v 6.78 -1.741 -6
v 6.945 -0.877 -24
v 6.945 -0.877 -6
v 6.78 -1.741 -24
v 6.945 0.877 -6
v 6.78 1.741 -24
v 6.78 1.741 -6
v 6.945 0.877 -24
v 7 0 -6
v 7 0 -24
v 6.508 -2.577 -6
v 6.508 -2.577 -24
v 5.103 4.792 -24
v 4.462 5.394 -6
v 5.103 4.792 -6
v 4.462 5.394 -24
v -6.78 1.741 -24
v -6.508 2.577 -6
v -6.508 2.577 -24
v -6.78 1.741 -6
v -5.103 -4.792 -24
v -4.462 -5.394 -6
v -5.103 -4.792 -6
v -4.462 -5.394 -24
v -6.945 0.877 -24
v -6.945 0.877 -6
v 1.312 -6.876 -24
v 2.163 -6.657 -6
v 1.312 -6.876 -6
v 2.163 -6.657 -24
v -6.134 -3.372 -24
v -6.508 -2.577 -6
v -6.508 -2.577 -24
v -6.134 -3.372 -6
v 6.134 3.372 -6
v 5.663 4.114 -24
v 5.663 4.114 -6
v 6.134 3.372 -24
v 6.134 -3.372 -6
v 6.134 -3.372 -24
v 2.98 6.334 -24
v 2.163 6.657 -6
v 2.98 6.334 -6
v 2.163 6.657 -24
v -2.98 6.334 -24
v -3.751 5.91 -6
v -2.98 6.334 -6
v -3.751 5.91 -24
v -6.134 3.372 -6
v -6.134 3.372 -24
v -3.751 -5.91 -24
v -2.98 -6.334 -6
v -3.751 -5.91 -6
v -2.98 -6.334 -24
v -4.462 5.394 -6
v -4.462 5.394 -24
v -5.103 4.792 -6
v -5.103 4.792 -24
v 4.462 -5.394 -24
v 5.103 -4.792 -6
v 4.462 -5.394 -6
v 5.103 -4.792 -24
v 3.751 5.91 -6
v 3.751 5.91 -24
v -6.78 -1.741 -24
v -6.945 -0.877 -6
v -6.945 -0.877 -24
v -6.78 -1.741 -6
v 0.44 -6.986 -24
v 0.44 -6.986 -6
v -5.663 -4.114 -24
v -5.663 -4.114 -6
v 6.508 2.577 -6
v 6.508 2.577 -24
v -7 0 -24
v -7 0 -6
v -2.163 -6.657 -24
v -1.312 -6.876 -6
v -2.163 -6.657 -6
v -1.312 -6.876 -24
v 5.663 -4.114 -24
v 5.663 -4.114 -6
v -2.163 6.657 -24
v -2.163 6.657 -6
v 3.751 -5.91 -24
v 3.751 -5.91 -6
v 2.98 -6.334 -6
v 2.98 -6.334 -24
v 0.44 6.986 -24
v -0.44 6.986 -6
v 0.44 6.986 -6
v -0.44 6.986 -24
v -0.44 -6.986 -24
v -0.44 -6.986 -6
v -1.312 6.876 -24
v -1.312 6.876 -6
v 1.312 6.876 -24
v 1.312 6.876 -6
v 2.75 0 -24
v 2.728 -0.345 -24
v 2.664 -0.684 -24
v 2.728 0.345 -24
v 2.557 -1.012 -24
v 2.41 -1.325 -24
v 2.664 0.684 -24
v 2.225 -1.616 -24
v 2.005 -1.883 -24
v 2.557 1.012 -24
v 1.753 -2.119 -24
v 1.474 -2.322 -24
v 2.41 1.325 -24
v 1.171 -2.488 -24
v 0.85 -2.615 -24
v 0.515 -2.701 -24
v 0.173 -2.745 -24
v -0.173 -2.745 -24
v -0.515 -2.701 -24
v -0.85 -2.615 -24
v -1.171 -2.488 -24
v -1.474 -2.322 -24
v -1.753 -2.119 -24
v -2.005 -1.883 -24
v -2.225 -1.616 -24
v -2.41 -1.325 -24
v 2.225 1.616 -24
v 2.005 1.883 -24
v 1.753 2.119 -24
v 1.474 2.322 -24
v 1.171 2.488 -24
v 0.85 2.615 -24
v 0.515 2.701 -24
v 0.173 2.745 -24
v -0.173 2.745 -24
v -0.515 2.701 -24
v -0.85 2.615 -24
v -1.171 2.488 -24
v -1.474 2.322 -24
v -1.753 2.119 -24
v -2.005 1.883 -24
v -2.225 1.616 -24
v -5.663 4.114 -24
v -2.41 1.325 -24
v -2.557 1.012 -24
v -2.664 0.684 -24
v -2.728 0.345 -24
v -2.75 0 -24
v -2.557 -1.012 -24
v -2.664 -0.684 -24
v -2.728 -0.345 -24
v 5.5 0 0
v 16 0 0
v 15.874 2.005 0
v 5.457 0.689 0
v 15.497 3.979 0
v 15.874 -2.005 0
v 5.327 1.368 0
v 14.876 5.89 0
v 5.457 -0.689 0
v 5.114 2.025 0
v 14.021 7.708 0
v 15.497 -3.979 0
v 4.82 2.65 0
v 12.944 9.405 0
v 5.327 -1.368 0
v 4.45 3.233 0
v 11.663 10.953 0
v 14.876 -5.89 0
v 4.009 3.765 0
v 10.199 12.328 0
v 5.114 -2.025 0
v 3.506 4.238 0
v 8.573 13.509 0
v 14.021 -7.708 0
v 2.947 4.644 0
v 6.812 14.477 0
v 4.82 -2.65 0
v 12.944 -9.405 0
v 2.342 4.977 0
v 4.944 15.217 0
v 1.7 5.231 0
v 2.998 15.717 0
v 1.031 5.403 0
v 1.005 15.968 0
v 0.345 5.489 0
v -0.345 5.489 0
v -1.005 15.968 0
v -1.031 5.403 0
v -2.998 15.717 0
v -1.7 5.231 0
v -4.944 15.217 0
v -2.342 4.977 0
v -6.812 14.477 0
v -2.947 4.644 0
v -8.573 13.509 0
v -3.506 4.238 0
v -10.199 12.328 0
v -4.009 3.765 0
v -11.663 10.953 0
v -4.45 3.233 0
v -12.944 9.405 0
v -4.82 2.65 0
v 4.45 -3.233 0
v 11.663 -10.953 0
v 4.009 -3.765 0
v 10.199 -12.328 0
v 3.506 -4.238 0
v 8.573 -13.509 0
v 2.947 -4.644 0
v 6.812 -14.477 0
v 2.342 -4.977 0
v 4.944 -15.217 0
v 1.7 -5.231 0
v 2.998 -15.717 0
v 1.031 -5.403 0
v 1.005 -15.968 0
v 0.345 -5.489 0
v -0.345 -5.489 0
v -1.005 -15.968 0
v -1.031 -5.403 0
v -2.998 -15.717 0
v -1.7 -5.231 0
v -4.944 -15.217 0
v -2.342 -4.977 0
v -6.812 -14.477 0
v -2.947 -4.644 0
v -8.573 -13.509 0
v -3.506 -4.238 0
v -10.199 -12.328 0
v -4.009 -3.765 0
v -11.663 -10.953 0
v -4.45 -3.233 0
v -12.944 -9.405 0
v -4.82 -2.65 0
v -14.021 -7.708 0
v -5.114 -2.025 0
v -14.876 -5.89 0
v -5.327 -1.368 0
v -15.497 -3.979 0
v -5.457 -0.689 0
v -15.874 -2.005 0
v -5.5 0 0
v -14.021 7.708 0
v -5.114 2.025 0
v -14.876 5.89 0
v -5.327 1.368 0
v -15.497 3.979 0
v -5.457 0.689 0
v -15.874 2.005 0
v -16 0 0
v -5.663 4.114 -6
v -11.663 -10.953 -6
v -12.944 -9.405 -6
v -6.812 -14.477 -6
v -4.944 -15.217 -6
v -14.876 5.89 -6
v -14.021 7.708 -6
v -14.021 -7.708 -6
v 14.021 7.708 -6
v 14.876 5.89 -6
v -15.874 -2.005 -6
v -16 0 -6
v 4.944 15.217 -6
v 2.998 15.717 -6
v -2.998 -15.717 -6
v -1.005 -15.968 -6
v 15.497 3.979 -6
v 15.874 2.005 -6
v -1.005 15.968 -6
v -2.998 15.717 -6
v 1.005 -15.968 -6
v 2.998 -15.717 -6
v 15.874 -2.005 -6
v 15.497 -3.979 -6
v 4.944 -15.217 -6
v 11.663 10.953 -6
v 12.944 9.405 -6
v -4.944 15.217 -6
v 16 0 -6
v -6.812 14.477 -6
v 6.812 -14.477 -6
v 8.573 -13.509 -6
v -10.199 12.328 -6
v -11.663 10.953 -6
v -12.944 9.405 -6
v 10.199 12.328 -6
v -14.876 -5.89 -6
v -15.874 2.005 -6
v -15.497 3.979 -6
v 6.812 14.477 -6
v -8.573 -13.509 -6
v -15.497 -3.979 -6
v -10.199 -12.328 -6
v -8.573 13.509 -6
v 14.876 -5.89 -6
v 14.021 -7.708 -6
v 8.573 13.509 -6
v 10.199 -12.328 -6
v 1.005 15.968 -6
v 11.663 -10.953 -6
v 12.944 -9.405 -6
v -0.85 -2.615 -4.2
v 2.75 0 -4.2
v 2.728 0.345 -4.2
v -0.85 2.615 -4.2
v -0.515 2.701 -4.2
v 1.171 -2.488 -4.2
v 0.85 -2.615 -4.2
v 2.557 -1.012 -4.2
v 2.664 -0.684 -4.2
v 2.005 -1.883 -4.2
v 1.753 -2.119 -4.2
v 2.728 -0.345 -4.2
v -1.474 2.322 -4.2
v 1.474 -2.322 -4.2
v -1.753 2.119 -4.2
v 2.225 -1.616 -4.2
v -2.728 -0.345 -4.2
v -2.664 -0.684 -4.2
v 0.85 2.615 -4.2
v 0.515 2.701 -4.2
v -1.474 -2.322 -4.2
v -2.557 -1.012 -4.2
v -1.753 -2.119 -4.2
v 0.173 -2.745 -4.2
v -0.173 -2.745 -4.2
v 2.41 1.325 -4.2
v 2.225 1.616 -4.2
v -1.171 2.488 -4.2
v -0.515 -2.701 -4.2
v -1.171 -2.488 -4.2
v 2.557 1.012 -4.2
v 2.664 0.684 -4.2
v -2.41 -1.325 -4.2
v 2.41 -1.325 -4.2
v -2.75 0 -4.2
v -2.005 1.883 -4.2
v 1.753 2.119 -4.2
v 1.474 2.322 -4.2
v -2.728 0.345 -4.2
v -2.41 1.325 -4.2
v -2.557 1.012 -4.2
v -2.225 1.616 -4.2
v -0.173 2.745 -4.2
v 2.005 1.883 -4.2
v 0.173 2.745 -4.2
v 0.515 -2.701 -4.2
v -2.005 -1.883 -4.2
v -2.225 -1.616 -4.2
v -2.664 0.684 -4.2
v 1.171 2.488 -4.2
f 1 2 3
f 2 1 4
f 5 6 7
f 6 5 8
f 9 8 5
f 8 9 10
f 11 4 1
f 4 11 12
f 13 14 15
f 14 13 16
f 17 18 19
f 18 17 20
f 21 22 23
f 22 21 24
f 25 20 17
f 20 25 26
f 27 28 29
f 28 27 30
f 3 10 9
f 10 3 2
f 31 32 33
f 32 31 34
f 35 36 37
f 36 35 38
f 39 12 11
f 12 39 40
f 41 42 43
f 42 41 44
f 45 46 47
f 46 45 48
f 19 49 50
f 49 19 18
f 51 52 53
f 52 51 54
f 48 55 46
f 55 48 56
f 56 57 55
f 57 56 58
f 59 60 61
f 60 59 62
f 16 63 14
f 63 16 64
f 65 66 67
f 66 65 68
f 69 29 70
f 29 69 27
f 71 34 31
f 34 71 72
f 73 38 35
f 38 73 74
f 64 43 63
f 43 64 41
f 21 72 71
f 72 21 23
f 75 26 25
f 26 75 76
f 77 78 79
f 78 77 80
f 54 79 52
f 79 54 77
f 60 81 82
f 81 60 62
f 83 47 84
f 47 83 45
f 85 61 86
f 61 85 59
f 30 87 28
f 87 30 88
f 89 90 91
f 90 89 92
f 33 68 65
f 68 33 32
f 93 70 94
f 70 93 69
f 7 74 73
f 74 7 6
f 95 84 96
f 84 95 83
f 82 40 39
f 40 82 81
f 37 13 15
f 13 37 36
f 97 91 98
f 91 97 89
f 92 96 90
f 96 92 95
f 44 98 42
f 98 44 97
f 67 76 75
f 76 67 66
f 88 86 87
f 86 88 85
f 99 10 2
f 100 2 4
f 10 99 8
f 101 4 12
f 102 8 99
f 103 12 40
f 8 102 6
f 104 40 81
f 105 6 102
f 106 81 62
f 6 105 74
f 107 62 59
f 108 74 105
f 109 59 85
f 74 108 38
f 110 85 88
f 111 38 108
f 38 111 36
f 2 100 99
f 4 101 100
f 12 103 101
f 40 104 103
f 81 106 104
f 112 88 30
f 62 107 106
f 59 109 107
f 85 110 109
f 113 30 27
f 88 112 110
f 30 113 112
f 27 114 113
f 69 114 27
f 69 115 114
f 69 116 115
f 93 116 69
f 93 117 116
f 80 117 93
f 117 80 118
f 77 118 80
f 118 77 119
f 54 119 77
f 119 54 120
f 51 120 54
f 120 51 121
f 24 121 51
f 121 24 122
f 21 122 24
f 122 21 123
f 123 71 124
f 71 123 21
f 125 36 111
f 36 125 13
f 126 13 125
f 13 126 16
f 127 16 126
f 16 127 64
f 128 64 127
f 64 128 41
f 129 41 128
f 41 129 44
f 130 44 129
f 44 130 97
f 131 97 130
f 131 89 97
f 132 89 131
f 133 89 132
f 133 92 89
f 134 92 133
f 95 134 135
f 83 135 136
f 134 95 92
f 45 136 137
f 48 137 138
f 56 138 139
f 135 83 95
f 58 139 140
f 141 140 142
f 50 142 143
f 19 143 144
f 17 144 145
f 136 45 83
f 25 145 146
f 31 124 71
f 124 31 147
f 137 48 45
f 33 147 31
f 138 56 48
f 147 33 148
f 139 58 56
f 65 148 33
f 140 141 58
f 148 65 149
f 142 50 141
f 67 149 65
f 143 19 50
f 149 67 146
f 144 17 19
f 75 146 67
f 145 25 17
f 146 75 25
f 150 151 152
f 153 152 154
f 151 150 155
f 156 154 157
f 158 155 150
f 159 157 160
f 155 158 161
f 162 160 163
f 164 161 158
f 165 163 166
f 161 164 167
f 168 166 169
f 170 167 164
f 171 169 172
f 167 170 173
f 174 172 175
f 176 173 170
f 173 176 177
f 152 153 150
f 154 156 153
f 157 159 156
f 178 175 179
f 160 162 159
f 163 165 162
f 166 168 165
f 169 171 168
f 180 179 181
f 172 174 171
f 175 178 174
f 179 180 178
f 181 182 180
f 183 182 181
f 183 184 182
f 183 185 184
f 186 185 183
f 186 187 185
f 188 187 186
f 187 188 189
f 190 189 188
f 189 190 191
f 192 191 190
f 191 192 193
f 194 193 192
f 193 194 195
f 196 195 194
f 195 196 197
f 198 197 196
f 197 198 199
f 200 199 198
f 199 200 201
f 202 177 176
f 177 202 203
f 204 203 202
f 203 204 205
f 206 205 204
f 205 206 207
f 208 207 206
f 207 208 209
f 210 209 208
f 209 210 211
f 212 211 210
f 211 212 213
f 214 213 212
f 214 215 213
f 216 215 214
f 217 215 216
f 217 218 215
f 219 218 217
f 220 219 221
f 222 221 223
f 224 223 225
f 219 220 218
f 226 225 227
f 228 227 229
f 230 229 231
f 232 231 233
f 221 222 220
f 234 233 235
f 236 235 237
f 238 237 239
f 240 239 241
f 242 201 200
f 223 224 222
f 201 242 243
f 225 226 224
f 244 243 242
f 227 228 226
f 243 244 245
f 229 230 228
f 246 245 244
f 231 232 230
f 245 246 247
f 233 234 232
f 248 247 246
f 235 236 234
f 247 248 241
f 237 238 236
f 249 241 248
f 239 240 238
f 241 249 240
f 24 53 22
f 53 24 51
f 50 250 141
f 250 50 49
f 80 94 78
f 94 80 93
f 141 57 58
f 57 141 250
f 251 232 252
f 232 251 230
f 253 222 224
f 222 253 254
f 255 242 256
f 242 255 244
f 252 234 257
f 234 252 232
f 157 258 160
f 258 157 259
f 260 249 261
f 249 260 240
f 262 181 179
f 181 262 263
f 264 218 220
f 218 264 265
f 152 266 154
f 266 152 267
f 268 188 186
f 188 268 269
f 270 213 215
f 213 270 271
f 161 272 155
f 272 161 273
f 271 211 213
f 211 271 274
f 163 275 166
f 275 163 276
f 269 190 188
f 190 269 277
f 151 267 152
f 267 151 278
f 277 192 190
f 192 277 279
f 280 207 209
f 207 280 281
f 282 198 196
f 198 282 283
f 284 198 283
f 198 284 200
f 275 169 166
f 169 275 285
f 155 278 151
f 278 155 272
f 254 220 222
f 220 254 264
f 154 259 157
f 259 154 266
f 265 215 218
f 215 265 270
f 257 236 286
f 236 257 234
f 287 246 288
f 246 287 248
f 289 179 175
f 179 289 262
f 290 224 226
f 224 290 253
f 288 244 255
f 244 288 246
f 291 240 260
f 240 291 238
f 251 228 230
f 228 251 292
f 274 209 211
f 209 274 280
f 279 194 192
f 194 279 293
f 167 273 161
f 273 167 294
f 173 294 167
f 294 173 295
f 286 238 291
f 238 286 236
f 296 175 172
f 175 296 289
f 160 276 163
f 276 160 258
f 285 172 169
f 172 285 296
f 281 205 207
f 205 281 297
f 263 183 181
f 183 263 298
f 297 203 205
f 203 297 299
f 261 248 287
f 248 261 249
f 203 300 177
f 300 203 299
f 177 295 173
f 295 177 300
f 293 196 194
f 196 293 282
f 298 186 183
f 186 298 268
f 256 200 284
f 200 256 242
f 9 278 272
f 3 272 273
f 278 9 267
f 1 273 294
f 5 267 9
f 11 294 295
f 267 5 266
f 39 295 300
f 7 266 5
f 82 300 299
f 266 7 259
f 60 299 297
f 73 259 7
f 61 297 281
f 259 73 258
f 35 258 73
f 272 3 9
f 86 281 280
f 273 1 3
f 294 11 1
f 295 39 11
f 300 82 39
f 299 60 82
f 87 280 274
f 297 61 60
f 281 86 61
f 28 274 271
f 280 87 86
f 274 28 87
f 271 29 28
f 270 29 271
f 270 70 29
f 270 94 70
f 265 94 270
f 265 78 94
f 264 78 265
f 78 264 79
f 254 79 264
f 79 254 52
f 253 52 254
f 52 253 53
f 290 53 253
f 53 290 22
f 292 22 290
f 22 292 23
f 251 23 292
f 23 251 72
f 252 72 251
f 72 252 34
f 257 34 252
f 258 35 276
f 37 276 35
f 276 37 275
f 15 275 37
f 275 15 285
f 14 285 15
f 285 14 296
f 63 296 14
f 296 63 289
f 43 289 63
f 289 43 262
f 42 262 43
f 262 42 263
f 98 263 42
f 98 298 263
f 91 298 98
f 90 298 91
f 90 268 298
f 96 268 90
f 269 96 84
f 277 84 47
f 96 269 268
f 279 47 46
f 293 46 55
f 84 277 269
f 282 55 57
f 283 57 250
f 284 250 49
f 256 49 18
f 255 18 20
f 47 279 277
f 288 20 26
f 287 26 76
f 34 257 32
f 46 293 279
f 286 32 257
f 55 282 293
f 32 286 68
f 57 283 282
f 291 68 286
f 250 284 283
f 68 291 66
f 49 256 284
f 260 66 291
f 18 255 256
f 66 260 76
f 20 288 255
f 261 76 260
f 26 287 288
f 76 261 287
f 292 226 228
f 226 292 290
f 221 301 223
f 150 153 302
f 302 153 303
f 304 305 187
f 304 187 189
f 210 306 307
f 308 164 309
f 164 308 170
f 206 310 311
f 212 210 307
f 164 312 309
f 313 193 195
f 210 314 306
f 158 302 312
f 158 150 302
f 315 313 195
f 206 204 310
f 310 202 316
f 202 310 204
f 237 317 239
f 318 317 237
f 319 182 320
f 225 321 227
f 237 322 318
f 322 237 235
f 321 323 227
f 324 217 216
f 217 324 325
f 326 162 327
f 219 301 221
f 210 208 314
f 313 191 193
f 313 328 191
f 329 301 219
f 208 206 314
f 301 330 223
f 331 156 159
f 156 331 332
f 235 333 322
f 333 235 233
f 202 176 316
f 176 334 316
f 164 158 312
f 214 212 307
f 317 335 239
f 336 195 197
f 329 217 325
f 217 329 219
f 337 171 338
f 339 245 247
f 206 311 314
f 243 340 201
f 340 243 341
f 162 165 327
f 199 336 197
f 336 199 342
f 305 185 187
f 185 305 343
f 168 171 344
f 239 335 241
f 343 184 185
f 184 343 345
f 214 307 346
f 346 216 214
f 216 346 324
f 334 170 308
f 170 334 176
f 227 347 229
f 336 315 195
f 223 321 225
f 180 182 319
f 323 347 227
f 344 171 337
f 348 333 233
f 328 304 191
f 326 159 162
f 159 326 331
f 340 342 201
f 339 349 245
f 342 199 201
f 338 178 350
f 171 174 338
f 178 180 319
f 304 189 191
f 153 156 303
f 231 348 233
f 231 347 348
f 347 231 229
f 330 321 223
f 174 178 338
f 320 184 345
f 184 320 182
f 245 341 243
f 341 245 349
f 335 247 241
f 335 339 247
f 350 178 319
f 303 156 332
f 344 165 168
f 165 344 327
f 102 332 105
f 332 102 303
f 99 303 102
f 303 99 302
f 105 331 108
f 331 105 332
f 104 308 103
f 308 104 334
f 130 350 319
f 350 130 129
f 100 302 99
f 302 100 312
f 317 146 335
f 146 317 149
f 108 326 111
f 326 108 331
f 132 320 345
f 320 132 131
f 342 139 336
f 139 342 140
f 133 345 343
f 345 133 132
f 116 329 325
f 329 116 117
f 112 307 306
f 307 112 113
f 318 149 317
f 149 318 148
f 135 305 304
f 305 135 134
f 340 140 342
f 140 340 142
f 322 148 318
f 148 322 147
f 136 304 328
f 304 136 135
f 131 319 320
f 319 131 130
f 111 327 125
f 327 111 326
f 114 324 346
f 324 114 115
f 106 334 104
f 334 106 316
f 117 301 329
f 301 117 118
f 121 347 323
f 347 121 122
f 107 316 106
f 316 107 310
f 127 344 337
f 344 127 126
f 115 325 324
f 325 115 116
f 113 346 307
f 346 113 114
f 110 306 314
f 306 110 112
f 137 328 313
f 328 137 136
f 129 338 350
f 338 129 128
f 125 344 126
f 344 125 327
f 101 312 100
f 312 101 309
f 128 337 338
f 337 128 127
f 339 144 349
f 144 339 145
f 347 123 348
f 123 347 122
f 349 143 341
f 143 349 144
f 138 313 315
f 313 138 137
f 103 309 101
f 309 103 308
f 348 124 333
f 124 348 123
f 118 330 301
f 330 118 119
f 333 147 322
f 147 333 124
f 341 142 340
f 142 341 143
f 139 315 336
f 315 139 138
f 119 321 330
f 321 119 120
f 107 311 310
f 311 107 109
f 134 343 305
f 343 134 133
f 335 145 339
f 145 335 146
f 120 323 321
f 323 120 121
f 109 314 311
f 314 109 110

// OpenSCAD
$fn = 50;


difference() {
	union() {
		translate(v = [0, 0, -24.0000000000]) {
			cylinder(h = 24, r = 7.0000000000);
		}
		translate(v = [0, 0, -6.0000000000]) {
			cylinder(h = 6, r = 16.0000000000);
		}
	}
	union() {
		translate(v = [0, 0, 0]) {
			rotate(a = [0, 0, 0]) {
				difference() {
					union() {
						#translate(v = [0, 0, -24.0000000000]) {
							cylinder(h = 24, r = 2.2500000000);
						}
						#translate(v = [0, 0, -4.2000000000]) {
							cylinder(h = 4.2000000000, r1 = 2.7500000000, r2 = 5.5000000000);
						}
						#translate(v = [0, 0, -24.0000000000]) {
							cylinder(h = 24, r = 2.7500000000);
						}
						#translate(v = [0, 0, -24.0000000000]) {
							cylinder(h = 24, r = 2.2500000000);
						}
					}
					union();
				}
			}
		}
	}
}
